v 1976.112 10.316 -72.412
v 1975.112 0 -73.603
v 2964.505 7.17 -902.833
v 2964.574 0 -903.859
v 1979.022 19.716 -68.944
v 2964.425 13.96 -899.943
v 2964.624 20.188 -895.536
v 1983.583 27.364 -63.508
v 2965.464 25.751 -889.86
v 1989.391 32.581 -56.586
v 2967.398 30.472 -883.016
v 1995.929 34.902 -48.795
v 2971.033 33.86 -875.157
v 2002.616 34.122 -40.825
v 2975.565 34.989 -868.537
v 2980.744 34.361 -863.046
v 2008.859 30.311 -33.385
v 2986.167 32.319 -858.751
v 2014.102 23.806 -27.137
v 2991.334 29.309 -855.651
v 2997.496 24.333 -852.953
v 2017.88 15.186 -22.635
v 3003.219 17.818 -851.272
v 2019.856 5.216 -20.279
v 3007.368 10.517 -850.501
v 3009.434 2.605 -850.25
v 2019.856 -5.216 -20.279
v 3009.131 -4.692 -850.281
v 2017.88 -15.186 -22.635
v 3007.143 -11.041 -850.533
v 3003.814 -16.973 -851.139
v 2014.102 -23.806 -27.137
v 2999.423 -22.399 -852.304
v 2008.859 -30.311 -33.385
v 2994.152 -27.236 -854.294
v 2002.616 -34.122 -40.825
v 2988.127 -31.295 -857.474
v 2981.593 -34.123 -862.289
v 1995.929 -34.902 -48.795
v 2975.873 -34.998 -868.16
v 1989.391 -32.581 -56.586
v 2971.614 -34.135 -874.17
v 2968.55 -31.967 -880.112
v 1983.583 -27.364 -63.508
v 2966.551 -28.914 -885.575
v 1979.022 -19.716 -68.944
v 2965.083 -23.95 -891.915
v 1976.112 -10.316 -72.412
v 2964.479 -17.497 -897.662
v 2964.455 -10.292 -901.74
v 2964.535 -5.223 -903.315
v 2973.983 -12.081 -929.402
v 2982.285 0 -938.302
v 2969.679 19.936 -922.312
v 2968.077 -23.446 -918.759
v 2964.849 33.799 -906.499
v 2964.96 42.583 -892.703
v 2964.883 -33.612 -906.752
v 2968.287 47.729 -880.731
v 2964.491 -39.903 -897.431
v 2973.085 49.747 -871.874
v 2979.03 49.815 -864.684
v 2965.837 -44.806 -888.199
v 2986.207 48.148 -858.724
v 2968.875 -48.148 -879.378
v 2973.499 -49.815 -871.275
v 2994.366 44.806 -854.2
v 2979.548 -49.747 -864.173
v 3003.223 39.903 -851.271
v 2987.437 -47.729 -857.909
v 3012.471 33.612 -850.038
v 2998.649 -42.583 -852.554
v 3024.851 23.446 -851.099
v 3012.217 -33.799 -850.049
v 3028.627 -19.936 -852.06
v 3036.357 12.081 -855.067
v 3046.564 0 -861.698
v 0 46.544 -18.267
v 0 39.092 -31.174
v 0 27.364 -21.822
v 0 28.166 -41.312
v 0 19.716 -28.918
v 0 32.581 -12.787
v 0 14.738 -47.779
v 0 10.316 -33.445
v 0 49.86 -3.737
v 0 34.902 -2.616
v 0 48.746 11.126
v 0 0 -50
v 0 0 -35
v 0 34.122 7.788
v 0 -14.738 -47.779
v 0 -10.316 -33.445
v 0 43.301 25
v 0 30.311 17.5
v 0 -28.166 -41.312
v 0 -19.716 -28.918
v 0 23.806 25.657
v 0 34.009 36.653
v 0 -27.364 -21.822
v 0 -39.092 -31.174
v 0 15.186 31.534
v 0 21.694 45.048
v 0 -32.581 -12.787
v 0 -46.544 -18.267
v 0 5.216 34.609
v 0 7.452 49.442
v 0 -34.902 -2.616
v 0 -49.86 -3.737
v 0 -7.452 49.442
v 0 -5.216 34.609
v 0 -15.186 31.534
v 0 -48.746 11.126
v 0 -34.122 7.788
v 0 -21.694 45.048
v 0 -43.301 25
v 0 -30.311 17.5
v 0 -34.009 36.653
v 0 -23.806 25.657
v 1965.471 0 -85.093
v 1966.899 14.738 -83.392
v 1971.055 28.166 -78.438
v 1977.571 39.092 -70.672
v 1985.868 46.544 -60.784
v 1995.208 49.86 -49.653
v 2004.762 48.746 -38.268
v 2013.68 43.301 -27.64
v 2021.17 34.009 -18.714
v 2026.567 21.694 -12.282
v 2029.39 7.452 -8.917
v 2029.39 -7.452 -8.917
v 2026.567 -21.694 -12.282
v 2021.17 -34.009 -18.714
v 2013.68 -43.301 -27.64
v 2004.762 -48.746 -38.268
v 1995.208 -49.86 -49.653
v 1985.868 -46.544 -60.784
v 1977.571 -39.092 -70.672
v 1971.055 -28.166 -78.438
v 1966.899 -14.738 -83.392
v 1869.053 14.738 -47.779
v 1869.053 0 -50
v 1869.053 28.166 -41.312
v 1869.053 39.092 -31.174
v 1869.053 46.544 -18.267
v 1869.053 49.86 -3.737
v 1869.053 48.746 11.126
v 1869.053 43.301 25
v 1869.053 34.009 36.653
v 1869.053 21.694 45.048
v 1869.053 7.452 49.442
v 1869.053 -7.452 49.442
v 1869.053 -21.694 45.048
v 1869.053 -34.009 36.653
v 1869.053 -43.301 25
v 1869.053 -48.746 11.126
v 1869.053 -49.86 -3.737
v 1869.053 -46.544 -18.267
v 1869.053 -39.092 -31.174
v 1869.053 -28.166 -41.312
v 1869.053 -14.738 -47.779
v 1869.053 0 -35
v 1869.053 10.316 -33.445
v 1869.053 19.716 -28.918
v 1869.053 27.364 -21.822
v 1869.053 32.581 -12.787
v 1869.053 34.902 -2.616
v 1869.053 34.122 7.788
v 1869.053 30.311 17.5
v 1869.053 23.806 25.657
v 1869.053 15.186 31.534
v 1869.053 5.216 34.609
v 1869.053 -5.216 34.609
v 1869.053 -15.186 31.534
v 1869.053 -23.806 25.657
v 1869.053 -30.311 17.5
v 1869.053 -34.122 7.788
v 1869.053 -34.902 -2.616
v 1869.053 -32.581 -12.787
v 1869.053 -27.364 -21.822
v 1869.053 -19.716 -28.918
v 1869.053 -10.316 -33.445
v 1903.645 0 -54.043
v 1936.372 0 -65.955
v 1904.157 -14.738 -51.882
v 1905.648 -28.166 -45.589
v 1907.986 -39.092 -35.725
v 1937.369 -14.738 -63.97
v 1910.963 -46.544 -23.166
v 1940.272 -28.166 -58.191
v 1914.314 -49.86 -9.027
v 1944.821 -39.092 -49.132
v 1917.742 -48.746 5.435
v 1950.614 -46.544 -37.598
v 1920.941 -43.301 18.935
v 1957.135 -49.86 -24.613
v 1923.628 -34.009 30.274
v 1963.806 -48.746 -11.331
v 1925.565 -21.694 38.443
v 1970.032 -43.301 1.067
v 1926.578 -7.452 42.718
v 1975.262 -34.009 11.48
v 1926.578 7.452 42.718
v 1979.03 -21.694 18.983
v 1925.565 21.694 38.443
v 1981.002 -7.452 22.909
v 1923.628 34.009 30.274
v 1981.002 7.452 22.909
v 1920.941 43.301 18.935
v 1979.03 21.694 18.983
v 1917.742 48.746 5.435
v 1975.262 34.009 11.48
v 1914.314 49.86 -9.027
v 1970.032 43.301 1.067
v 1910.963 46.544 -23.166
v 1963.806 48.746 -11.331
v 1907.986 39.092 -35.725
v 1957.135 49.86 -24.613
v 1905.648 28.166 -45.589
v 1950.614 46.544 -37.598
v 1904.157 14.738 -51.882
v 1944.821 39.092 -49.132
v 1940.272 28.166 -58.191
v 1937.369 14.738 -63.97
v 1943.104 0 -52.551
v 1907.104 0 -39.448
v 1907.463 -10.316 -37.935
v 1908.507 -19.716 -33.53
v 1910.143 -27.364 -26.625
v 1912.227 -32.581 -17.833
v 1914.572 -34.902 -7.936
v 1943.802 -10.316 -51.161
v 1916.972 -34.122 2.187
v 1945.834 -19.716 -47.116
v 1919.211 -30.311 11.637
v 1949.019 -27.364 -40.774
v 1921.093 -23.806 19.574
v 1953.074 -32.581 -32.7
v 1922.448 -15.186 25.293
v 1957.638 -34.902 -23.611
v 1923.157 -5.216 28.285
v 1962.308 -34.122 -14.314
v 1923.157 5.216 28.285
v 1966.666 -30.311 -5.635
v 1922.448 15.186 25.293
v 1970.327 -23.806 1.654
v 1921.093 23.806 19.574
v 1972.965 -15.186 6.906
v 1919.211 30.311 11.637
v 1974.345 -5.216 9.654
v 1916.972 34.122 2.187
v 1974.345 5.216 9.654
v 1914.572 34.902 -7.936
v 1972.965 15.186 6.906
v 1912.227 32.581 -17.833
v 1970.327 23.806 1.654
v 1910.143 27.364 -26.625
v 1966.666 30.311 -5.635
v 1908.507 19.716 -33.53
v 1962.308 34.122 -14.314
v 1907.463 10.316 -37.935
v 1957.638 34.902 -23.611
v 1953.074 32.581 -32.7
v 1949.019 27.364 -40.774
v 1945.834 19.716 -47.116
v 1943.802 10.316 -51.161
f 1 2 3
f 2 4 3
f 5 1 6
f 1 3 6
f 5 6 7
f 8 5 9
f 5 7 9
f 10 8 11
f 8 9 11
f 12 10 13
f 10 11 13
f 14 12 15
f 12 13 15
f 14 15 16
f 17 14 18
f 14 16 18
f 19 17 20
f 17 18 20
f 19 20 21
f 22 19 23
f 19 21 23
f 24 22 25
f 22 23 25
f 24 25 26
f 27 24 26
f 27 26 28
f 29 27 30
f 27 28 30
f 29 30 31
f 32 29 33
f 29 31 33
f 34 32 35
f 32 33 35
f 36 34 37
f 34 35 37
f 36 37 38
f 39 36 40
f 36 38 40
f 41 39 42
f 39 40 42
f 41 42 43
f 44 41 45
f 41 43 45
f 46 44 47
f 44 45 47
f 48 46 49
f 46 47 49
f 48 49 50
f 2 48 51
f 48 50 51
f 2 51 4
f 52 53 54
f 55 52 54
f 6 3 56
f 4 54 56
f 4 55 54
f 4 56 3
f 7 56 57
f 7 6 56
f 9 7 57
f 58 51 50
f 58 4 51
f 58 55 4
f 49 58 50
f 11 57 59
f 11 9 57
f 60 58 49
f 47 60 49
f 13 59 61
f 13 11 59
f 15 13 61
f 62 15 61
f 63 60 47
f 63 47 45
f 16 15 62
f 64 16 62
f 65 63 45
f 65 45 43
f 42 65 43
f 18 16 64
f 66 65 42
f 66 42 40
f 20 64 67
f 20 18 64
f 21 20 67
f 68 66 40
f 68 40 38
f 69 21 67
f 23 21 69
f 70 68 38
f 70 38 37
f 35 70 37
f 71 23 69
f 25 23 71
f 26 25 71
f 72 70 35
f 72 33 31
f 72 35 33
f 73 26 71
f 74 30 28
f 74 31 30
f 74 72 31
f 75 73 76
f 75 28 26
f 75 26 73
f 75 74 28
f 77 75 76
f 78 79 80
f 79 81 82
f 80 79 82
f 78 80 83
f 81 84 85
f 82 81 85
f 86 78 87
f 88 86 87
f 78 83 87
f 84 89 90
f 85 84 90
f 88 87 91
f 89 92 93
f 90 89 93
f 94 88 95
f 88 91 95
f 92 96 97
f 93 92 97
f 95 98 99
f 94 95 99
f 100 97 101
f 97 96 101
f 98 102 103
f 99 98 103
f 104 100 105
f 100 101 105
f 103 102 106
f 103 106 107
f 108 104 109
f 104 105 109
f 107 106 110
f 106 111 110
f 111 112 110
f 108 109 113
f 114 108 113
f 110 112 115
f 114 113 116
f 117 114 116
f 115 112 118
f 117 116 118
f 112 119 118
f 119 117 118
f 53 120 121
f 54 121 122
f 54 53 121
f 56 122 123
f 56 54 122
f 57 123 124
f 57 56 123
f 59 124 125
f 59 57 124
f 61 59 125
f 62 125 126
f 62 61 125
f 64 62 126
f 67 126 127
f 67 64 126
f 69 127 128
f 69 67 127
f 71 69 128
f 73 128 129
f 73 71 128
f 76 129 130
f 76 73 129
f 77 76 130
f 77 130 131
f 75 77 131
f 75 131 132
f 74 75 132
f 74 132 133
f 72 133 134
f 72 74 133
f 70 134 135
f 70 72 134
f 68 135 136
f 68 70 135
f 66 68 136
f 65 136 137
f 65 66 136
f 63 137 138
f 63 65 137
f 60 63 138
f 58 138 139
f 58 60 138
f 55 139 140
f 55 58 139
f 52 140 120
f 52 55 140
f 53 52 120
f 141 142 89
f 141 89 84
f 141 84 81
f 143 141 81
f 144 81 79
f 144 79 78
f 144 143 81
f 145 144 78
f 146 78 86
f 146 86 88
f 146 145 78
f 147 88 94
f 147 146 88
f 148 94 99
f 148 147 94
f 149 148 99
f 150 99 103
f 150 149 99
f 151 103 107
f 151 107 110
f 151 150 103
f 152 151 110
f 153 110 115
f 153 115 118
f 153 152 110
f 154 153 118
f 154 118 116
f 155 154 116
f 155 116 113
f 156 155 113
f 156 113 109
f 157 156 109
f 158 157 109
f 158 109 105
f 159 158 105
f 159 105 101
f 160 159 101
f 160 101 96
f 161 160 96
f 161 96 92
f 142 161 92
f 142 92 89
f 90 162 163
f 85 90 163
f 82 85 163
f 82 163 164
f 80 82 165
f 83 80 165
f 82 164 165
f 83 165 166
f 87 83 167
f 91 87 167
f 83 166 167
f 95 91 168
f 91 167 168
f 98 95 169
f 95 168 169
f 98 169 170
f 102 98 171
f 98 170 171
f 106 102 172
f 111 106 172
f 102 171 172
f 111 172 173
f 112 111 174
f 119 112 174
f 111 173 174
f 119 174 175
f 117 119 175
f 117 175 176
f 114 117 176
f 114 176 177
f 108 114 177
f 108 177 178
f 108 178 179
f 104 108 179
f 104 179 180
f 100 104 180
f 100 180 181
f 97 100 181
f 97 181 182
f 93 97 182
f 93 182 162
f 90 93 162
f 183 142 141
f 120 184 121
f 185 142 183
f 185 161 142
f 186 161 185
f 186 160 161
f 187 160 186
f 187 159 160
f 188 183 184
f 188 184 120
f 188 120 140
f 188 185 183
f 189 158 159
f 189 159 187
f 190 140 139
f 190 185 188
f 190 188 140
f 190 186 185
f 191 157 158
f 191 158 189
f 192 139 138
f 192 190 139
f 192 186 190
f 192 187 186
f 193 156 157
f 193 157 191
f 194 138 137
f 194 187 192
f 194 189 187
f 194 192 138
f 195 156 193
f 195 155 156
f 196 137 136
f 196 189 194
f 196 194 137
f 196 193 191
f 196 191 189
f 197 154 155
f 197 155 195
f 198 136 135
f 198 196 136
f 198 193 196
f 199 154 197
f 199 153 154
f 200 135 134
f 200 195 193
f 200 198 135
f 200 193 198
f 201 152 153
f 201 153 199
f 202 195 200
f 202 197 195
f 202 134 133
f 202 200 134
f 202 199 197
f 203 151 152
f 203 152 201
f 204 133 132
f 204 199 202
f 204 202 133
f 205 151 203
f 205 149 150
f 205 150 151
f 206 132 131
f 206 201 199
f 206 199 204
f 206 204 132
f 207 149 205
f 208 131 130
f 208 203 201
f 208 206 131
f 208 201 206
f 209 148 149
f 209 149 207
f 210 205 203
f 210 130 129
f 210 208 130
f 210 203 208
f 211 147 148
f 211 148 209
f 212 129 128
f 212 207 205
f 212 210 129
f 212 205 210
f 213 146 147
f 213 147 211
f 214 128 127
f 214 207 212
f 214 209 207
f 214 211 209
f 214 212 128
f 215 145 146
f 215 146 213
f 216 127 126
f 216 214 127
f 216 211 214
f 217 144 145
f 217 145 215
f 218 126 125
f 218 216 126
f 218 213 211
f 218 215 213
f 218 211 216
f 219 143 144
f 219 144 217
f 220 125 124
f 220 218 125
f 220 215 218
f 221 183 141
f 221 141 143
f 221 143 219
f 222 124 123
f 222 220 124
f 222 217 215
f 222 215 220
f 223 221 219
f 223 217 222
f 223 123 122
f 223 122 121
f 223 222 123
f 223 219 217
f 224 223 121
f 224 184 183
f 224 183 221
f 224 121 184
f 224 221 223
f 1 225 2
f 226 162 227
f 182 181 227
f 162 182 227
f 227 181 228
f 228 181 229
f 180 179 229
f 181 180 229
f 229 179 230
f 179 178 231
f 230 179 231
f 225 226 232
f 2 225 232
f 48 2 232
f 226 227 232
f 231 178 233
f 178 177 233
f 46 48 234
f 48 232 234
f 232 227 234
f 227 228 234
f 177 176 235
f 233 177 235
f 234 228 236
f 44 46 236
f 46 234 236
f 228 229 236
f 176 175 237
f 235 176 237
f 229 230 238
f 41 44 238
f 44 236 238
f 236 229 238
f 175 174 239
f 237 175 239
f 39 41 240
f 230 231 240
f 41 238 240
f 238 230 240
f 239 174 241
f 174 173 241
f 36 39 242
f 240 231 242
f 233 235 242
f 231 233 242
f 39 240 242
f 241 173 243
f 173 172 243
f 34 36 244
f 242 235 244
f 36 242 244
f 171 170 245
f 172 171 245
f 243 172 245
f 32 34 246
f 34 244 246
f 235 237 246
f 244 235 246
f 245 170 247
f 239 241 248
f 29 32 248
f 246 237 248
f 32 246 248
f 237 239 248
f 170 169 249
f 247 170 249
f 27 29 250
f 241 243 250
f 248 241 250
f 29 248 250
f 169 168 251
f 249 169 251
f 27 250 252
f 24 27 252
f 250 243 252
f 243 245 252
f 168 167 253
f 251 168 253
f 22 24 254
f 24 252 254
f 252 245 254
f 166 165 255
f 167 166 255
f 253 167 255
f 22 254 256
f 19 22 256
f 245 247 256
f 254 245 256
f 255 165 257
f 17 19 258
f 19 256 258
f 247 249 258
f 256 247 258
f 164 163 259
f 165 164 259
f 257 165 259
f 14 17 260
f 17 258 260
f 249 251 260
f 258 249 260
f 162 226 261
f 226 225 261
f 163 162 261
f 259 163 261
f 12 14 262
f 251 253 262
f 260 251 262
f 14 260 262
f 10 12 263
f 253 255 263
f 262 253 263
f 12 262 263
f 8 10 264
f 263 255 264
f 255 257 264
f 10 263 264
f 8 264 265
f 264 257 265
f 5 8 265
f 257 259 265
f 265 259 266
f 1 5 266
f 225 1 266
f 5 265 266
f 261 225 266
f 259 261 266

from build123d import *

# Parameters (mm, degrees)
SKETCH3_R               = 50
SKETCH3_R_2             = 35
CUT_EXTRUDE1_DEPTH      = 3189.175692756
CUT_EXTRUDE1_DEPTH_BACK = 3189.175692756
SKETCH4_R               = 50


with BuildPart() as part:
    # Sweep1: sweep along a path in Sketch2
    with BuildLine(Plane(origin=(0, 0, 0), x_dir=(1, 0, 0), z_dir=(0, 1, 0))) as sweep1_path:
        Line((0, 0), (1869.052500439, 0))
        ThreePointArc((1869.052500439, 0), (1937.456529104, 12.061475843), (1997.610022376, 46.791111376))
        Line((1997.610022376, 46.791111376), (3014.424780627, 900))
    # Sketch3 → Sweep1 (sweep)
    with BuildSketch(Plane(origin=(0, 0, 0), x_dir=(0, 0, -1), z_dir=(1, 0, 0))):
        Circle(SKETCH3_R)
        Circle(SKETCH3_R_2, mode=Mode.SUBTRACT)
    sweep(path=sweep1_path.line)

    # Sketch4 → Cut-Extrude1 (cut, two sides: drawn at the far end of the back side and taken through both)
    with BuildSketch(Plane(origin=(0, 0, 0), x_dir=(1, 0, 0), z_dir=(0, 1, 0)).offset(-CUT_EXTRUDE1_DEPTH_BACK)):
        with Locations((3014.424780627, 900)):
            Circle(SKETCH4_R)
    extrude(amount=CUT_EXTRUDE1_DEPTH + CUT_EXTRUDE1_DEPTH_BACK, mode=Mode.SUBTRACT)


solid = part.part
